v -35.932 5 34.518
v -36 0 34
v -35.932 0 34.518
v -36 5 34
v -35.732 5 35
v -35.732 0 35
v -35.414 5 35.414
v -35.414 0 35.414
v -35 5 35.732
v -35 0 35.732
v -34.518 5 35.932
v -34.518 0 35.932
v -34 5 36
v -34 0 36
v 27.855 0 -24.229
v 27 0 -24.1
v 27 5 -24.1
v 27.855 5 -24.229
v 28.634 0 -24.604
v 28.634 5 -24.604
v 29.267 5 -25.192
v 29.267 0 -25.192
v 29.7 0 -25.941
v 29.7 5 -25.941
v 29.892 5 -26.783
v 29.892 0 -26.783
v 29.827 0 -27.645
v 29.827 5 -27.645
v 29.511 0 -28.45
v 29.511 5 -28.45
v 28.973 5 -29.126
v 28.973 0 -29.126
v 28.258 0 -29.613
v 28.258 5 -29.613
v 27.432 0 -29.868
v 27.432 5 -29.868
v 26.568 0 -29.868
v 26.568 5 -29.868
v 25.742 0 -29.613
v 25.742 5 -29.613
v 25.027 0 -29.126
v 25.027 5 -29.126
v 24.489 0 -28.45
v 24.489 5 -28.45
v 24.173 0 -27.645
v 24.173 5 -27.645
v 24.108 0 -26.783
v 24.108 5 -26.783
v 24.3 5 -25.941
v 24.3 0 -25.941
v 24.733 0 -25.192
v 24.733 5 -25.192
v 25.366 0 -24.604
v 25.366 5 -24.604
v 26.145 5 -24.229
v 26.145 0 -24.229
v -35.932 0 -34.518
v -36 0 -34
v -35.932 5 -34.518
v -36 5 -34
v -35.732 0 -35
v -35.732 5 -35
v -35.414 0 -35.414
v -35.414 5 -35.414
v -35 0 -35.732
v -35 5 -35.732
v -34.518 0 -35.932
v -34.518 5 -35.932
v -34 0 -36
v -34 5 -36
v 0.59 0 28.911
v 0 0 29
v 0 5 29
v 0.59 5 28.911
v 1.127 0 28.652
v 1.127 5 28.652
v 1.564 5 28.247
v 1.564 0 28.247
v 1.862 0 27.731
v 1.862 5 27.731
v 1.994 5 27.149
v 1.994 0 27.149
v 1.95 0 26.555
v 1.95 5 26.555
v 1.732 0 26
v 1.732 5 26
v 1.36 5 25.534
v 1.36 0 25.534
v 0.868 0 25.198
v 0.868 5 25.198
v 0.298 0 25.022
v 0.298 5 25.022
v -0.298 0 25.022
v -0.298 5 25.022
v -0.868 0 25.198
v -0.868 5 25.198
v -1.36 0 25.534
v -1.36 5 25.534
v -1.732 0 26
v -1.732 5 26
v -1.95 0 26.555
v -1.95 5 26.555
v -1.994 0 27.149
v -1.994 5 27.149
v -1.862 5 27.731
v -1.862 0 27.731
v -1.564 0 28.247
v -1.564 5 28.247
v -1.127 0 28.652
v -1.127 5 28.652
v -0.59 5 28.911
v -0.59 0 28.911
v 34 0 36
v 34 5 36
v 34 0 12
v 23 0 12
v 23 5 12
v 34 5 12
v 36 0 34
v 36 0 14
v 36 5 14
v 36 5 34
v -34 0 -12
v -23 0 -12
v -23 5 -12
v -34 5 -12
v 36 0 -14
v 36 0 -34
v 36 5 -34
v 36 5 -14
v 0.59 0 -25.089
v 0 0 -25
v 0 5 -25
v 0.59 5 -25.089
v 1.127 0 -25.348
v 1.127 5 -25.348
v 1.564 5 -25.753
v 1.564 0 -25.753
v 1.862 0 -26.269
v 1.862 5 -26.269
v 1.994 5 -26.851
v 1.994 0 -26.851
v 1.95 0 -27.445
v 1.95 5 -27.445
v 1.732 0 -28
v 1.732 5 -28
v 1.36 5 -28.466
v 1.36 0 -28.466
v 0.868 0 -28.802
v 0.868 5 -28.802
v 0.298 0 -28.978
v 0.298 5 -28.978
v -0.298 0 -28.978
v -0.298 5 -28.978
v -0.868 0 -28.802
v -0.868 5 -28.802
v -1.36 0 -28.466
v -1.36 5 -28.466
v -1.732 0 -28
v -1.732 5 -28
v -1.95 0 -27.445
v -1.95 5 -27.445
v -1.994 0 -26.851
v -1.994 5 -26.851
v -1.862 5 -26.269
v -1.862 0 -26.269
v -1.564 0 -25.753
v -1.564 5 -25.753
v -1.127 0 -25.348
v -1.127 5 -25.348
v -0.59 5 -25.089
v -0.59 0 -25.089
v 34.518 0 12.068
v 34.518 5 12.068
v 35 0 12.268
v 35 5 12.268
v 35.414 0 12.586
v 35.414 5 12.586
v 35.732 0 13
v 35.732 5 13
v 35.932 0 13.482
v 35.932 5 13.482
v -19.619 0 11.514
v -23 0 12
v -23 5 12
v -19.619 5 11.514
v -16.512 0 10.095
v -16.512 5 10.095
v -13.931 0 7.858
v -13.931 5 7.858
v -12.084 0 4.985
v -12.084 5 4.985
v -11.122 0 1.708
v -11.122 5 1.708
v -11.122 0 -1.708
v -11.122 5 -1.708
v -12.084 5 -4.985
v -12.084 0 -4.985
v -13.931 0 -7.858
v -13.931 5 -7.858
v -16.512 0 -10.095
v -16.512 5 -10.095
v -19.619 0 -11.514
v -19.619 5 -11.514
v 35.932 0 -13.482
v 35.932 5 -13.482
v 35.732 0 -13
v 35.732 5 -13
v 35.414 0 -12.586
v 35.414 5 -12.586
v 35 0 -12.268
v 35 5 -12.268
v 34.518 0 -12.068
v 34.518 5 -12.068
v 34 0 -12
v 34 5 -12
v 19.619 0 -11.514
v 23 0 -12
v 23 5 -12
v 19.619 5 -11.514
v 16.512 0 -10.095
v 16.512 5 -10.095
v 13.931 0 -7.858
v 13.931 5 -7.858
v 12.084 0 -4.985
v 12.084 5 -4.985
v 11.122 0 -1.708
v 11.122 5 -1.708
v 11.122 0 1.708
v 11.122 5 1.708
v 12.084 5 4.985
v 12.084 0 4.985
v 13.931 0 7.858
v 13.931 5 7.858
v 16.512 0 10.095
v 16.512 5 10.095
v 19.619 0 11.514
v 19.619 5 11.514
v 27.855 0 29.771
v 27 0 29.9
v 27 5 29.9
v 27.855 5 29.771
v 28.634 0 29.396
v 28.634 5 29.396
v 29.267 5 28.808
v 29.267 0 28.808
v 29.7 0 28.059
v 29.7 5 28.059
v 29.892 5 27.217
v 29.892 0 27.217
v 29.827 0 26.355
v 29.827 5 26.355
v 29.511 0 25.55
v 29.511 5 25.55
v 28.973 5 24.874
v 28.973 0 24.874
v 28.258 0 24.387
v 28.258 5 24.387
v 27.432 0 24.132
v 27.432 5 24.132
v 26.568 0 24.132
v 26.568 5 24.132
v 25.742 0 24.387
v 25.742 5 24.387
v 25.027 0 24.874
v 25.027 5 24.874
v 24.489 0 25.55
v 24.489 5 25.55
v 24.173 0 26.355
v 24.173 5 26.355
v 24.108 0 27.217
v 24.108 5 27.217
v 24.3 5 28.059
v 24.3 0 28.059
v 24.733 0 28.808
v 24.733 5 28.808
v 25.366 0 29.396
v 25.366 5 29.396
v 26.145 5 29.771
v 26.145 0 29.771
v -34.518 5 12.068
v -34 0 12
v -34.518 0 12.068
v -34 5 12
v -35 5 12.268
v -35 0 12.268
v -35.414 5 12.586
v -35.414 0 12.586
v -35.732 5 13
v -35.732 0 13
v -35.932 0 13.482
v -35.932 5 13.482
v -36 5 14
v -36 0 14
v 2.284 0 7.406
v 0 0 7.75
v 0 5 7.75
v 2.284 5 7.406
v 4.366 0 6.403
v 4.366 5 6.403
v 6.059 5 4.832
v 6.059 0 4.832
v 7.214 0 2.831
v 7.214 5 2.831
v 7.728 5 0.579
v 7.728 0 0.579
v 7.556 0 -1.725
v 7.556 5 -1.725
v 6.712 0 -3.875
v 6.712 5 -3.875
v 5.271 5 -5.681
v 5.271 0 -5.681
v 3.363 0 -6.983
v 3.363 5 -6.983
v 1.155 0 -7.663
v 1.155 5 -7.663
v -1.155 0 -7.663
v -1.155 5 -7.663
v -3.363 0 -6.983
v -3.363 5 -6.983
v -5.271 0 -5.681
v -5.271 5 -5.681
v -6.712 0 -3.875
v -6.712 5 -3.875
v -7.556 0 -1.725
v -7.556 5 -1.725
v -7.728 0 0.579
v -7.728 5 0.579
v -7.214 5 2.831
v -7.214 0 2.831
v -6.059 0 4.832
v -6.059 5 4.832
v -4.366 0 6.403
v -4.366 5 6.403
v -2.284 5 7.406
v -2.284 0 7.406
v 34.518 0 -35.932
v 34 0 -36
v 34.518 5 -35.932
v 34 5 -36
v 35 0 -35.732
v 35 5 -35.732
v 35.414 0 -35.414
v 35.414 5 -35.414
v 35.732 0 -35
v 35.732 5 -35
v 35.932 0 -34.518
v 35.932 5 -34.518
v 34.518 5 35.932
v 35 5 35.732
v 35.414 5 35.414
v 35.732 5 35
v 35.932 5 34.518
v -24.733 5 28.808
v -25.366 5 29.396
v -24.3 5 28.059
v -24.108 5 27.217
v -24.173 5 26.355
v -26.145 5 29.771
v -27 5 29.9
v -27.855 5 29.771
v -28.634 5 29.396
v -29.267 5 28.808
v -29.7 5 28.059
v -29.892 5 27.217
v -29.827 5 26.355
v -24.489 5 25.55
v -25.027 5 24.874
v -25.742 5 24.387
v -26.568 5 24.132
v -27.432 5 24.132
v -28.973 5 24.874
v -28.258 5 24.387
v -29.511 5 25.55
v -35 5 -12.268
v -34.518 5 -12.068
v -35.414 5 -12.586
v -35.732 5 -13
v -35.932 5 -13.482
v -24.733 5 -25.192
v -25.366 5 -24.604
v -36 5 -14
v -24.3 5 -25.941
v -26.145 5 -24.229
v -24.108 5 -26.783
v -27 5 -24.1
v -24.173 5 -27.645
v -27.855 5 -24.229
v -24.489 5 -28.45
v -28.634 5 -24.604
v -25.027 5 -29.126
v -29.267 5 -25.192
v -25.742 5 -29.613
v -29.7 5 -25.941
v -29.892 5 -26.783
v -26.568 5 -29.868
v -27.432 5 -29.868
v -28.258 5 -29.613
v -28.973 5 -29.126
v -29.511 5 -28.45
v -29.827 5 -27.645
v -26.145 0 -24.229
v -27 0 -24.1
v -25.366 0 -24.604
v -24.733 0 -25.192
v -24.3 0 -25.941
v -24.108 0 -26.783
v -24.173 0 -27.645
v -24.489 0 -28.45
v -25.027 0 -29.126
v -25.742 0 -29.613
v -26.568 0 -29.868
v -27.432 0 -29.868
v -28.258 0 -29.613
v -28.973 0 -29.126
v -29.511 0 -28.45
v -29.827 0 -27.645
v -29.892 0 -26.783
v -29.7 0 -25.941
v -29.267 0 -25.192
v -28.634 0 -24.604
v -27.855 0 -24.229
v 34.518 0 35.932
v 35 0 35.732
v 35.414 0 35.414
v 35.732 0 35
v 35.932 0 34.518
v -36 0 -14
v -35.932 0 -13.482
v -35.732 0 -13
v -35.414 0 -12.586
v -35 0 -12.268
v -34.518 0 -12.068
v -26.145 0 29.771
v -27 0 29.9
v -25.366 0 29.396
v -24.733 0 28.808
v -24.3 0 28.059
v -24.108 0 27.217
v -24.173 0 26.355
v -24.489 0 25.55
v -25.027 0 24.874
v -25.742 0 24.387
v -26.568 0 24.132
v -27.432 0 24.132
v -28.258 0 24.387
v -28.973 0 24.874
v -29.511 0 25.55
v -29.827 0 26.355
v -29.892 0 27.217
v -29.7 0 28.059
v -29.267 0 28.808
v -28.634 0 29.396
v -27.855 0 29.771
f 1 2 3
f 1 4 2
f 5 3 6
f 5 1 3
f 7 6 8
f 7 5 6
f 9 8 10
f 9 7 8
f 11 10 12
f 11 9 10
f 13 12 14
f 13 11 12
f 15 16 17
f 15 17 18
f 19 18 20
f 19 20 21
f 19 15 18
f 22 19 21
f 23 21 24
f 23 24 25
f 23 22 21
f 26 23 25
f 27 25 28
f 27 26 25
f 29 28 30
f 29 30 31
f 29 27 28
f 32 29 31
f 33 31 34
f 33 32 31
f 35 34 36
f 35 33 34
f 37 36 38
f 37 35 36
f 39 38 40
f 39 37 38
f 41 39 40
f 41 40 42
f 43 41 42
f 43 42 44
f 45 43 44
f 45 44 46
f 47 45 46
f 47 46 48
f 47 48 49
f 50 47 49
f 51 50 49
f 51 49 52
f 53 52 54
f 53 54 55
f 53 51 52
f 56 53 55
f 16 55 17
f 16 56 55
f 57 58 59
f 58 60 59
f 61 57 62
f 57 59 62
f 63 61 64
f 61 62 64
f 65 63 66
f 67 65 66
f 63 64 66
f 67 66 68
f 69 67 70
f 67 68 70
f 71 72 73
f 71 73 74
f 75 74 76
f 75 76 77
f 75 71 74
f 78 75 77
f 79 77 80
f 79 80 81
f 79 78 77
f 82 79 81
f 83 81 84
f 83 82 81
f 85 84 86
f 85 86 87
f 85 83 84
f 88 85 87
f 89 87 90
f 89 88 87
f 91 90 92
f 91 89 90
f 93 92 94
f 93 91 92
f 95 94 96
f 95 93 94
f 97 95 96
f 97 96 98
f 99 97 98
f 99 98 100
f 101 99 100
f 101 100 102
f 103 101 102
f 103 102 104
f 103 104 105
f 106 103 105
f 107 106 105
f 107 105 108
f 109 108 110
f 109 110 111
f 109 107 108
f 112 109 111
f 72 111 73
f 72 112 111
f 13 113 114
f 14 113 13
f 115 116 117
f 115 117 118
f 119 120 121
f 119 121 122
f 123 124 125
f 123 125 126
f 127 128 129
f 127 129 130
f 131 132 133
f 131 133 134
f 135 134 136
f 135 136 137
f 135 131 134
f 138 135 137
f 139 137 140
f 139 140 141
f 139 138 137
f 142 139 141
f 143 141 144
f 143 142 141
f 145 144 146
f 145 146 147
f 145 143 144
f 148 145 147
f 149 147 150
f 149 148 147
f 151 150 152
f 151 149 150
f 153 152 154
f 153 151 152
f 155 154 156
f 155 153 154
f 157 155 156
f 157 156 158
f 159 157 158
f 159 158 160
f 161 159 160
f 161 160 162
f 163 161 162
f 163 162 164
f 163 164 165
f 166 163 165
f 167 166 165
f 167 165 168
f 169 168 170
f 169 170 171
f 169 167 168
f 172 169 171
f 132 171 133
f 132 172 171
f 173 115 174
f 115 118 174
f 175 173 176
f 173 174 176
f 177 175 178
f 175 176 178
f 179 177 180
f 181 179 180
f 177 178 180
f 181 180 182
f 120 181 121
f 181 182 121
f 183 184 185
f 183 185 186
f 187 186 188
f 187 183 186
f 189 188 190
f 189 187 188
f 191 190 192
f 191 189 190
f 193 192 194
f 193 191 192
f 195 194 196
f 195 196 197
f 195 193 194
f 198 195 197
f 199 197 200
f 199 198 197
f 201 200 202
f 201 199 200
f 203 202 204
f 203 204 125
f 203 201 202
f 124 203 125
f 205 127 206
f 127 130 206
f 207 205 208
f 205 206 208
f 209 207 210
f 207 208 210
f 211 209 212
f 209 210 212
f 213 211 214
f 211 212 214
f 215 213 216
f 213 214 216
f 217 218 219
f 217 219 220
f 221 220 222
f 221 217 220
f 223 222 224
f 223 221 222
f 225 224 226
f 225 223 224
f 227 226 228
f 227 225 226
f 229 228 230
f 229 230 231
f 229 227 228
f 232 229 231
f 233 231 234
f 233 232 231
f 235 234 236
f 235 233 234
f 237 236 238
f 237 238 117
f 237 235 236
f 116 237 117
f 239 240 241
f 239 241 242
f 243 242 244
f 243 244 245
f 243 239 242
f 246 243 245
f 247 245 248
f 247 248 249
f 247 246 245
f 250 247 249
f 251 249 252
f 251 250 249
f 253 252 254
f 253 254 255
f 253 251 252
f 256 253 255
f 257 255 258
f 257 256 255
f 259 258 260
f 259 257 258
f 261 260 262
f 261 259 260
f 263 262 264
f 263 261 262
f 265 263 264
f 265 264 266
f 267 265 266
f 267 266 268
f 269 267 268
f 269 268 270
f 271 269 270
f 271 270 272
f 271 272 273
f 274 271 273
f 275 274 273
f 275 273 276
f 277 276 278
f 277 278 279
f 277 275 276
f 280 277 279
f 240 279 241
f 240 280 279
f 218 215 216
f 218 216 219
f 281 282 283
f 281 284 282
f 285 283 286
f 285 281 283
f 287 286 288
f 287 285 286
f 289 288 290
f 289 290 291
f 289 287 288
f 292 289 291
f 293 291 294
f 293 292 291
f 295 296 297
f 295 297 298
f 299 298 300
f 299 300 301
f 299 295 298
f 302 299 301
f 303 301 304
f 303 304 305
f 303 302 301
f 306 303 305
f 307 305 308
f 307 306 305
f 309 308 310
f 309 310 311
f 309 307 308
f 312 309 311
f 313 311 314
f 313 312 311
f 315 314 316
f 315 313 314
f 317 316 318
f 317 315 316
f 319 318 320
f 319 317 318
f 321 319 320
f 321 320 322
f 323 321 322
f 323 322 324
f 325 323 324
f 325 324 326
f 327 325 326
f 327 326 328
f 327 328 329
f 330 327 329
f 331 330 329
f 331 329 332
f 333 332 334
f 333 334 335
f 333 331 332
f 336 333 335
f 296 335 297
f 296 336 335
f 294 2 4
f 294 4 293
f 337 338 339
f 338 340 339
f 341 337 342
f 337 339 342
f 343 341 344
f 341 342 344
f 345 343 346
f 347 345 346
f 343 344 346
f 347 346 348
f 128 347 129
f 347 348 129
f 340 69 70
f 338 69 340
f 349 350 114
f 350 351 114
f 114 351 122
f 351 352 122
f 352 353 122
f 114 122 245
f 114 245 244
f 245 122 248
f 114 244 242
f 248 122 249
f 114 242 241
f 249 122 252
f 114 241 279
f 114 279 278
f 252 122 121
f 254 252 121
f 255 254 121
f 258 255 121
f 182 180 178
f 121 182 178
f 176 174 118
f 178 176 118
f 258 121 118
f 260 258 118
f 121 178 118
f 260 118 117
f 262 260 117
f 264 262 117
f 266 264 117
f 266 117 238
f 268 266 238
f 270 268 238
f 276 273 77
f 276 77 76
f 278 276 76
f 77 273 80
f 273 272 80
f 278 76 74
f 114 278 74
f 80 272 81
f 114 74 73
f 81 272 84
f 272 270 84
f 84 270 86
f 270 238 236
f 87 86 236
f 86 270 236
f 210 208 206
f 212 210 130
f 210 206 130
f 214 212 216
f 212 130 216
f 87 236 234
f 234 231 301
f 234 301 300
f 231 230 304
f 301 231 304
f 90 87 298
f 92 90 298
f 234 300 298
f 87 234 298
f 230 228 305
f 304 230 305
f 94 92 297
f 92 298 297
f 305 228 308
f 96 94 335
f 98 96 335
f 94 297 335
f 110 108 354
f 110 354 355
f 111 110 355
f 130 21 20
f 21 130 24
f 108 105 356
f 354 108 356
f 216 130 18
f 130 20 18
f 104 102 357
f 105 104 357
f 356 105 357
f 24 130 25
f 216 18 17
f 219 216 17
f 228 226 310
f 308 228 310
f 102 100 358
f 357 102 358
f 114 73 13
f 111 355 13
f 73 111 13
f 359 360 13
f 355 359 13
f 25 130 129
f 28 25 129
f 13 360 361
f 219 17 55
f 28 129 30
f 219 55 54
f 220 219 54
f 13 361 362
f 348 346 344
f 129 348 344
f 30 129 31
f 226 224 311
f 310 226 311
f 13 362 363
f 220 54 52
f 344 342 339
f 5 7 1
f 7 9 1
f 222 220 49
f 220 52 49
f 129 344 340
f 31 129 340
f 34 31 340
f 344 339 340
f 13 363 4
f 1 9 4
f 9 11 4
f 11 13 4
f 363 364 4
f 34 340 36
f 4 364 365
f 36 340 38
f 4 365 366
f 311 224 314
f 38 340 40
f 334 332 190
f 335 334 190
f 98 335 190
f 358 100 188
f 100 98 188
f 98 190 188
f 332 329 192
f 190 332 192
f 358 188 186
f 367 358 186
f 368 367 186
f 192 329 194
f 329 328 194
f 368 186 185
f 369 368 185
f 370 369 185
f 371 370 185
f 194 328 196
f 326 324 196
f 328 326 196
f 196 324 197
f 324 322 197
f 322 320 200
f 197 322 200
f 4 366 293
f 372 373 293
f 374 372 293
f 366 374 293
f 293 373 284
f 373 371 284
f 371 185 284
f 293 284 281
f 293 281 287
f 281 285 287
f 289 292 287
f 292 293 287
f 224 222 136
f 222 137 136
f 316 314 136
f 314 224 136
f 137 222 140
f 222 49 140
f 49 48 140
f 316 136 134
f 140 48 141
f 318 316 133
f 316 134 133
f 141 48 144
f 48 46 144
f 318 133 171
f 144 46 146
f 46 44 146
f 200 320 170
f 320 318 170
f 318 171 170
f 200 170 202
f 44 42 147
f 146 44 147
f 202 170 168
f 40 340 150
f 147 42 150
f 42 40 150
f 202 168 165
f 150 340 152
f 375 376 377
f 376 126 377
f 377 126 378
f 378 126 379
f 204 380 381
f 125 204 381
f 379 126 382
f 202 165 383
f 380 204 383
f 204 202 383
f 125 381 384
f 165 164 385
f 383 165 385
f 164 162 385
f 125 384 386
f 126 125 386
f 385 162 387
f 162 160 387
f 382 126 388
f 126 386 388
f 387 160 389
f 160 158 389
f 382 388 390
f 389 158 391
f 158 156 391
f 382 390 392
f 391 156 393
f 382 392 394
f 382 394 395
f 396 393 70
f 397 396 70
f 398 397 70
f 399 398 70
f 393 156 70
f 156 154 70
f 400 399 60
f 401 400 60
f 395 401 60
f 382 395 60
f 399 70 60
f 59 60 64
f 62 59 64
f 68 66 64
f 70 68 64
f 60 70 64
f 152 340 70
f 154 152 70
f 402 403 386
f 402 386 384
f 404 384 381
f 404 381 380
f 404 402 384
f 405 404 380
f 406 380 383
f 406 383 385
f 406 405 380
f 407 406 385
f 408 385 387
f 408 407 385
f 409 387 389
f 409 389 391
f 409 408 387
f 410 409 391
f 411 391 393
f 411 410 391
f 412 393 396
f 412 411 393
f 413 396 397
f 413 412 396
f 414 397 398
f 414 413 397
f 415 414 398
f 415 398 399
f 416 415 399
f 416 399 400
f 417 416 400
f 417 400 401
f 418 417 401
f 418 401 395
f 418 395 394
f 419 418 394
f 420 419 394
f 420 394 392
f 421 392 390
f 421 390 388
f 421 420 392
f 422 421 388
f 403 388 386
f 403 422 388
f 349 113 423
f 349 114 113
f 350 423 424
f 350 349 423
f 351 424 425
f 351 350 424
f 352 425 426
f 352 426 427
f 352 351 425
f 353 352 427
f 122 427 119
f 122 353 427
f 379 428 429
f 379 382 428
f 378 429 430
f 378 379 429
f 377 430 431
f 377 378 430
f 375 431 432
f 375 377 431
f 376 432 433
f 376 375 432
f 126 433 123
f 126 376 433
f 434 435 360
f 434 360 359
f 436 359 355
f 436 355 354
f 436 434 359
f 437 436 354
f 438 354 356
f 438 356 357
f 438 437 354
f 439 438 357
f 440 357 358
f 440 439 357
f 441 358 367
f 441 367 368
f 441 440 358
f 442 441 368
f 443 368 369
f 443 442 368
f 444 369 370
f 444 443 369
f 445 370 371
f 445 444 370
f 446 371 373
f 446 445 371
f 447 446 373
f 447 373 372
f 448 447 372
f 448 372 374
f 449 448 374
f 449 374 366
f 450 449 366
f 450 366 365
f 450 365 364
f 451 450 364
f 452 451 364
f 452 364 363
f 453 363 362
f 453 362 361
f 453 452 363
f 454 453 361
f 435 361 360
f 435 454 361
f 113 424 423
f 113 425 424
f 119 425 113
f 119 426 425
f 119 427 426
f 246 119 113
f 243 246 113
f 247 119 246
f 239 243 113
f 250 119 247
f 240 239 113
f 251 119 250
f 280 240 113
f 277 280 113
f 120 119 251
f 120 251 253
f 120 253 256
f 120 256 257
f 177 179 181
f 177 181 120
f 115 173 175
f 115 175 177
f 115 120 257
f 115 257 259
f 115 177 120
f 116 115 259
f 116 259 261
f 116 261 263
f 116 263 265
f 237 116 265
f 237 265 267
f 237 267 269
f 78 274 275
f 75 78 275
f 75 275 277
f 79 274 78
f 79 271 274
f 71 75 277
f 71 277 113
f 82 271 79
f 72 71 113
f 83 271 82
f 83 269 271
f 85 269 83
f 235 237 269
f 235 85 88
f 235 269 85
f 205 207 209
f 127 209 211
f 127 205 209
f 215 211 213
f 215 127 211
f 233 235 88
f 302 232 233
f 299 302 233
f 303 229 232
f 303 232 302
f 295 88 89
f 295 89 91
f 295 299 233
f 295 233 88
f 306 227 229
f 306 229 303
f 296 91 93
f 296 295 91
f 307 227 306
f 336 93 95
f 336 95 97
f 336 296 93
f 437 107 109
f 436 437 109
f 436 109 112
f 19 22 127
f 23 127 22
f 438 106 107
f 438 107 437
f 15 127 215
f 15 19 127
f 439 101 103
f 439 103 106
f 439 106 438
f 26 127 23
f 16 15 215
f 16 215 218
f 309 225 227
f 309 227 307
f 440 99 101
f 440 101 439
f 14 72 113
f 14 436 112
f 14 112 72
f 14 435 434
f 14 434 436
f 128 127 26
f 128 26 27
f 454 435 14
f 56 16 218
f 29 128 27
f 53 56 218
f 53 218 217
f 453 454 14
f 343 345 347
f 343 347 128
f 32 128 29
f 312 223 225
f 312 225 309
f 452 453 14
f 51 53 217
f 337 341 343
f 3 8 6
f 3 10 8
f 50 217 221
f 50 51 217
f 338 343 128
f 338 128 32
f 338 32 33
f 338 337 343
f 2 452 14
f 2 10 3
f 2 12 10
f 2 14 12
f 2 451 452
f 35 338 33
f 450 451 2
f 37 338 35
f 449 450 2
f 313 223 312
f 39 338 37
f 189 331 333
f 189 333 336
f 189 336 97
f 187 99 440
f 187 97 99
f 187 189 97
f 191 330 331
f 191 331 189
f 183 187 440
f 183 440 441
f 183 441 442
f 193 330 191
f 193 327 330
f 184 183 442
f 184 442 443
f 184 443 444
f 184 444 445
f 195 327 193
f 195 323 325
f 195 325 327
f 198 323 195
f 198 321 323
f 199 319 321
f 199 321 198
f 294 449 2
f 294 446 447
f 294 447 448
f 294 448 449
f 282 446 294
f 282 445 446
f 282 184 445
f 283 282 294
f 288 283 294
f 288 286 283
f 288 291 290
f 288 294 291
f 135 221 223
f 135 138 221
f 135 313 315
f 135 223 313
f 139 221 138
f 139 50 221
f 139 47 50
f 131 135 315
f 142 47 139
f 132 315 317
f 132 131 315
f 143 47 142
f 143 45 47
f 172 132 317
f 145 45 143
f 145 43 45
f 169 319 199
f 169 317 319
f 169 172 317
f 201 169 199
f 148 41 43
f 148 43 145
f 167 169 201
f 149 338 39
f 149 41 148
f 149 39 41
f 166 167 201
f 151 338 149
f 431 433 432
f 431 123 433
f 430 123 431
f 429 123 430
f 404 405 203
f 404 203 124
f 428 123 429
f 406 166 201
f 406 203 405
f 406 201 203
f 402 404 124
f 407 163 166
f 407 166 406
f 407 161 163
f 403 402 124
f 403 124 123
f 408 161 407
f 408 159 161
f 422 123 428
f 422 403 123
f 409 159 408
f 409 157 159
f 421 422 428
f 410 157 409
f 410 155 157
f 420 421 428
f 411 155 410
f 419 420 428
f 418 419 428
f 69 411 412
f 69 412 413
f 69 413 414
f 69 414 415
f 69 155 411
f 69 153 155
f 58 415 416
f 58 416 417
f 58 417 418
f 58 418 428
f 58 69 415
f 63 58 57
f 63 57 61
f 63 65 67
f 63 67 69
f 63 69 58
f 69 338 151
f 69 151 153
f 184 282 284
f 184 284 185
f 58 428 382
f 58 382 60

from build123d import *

# Parameters (mm, degrees)
SKETCH2_R           = 7.75
SKETCH2_R_2         = 2.9
SKETCH2_R_3         = 2
BOSS_EXTRUDE1_DEPTH = 5
FILLET1_R           = 2
FILLET2_R           = 2


with BuildPart() as part:
    # Sketch2 → Boss-Extrude1 (new body)
    with BuildSketch(Plane(origin=(0, 0, 0), x_dir=(1, 0, 0), z_dir=(0, 1, 0))):
        with BuildLine():
            Line((-36, 12), (-36, 36))
            Line((-36, 36), (36, 36))
            Line((36, 36), (36, 12))
            Line((36, 12), (23, 12))
            ThreePointArc((23, 12), (11, 0), (23, -12))
            Line((23, -12), (36, -12))
            Line((36, -12), (36, -36))
            Line((36, -36), (-36, -36))
            Line((-36, -36), (-36, -12))
            Line((-36, -12), (-23, -12))
            ThreePointArc((-23, -12), (-11, 0), (-23, 12))
            Line((-23, 12), (-36, 12))
        make_face()
        with Locations(Location((0, 0, 0), (0, 0, 270))):
            Circle(SKETCH2_R, mode=Mode.SUBTRACT)
        with Locations(Location((-27, 27, 0), (0, 0, 270))):
            Circle(SKETCH2_R_2, mode=Mode.SUBTRACT)
        with Locations(Location((27, 27, 0), (0, 0, 270))):
            Circle(SKETCH2_R_2, mode=Mode.SUBTRACT)
        with Locations(Location((27, -27, 0), (0, 0, 270))):
            Circle(SKETCH2_R_2, mode=Mode.SUBTRACT)
        with Locations(Location((-27, -27, 0), (0, 0, 270))):
            Circle(SKETCH2_R_2, mode=Mode.SUBTRACT)
        with Locations(Location((0, -27, 0), (0, 0, 270))):
            Circle(SKETCH2_R_3, mode=Mode.SUBTRACT)
        with Locations(Location((0, 27, 0), (0, 0, 270))):
            Circle(SKETCH2_R_3, mode=Mode.SUBTRACT)
    extrude(amount=BOSS_EXTRUDE1_DEPTH)

    # Fillet1
    fillet1_edges = [part.edges().sort_by_distance(p)[0] for p in [
        (36, 2.5, 36),
        (-36, 2.5, 36),
        (-36, 2.5, -36),
        (36, 2.5, -36),
    ]]
    fillet(fillet1_edges, radius=FILLET1_R)

    # Fillet2
    fillet2_edges = [part.edges().sort_by_distance(p)[0] for p in [
        (36, 2.5, -12),
        (36, 2.5, 12),
        (-36, 2.5, 12),
        (-36, 2.5, -12),
    ]]
    fillet(fillet2_edges, radius=FILLET2_R)


solid = part.part
